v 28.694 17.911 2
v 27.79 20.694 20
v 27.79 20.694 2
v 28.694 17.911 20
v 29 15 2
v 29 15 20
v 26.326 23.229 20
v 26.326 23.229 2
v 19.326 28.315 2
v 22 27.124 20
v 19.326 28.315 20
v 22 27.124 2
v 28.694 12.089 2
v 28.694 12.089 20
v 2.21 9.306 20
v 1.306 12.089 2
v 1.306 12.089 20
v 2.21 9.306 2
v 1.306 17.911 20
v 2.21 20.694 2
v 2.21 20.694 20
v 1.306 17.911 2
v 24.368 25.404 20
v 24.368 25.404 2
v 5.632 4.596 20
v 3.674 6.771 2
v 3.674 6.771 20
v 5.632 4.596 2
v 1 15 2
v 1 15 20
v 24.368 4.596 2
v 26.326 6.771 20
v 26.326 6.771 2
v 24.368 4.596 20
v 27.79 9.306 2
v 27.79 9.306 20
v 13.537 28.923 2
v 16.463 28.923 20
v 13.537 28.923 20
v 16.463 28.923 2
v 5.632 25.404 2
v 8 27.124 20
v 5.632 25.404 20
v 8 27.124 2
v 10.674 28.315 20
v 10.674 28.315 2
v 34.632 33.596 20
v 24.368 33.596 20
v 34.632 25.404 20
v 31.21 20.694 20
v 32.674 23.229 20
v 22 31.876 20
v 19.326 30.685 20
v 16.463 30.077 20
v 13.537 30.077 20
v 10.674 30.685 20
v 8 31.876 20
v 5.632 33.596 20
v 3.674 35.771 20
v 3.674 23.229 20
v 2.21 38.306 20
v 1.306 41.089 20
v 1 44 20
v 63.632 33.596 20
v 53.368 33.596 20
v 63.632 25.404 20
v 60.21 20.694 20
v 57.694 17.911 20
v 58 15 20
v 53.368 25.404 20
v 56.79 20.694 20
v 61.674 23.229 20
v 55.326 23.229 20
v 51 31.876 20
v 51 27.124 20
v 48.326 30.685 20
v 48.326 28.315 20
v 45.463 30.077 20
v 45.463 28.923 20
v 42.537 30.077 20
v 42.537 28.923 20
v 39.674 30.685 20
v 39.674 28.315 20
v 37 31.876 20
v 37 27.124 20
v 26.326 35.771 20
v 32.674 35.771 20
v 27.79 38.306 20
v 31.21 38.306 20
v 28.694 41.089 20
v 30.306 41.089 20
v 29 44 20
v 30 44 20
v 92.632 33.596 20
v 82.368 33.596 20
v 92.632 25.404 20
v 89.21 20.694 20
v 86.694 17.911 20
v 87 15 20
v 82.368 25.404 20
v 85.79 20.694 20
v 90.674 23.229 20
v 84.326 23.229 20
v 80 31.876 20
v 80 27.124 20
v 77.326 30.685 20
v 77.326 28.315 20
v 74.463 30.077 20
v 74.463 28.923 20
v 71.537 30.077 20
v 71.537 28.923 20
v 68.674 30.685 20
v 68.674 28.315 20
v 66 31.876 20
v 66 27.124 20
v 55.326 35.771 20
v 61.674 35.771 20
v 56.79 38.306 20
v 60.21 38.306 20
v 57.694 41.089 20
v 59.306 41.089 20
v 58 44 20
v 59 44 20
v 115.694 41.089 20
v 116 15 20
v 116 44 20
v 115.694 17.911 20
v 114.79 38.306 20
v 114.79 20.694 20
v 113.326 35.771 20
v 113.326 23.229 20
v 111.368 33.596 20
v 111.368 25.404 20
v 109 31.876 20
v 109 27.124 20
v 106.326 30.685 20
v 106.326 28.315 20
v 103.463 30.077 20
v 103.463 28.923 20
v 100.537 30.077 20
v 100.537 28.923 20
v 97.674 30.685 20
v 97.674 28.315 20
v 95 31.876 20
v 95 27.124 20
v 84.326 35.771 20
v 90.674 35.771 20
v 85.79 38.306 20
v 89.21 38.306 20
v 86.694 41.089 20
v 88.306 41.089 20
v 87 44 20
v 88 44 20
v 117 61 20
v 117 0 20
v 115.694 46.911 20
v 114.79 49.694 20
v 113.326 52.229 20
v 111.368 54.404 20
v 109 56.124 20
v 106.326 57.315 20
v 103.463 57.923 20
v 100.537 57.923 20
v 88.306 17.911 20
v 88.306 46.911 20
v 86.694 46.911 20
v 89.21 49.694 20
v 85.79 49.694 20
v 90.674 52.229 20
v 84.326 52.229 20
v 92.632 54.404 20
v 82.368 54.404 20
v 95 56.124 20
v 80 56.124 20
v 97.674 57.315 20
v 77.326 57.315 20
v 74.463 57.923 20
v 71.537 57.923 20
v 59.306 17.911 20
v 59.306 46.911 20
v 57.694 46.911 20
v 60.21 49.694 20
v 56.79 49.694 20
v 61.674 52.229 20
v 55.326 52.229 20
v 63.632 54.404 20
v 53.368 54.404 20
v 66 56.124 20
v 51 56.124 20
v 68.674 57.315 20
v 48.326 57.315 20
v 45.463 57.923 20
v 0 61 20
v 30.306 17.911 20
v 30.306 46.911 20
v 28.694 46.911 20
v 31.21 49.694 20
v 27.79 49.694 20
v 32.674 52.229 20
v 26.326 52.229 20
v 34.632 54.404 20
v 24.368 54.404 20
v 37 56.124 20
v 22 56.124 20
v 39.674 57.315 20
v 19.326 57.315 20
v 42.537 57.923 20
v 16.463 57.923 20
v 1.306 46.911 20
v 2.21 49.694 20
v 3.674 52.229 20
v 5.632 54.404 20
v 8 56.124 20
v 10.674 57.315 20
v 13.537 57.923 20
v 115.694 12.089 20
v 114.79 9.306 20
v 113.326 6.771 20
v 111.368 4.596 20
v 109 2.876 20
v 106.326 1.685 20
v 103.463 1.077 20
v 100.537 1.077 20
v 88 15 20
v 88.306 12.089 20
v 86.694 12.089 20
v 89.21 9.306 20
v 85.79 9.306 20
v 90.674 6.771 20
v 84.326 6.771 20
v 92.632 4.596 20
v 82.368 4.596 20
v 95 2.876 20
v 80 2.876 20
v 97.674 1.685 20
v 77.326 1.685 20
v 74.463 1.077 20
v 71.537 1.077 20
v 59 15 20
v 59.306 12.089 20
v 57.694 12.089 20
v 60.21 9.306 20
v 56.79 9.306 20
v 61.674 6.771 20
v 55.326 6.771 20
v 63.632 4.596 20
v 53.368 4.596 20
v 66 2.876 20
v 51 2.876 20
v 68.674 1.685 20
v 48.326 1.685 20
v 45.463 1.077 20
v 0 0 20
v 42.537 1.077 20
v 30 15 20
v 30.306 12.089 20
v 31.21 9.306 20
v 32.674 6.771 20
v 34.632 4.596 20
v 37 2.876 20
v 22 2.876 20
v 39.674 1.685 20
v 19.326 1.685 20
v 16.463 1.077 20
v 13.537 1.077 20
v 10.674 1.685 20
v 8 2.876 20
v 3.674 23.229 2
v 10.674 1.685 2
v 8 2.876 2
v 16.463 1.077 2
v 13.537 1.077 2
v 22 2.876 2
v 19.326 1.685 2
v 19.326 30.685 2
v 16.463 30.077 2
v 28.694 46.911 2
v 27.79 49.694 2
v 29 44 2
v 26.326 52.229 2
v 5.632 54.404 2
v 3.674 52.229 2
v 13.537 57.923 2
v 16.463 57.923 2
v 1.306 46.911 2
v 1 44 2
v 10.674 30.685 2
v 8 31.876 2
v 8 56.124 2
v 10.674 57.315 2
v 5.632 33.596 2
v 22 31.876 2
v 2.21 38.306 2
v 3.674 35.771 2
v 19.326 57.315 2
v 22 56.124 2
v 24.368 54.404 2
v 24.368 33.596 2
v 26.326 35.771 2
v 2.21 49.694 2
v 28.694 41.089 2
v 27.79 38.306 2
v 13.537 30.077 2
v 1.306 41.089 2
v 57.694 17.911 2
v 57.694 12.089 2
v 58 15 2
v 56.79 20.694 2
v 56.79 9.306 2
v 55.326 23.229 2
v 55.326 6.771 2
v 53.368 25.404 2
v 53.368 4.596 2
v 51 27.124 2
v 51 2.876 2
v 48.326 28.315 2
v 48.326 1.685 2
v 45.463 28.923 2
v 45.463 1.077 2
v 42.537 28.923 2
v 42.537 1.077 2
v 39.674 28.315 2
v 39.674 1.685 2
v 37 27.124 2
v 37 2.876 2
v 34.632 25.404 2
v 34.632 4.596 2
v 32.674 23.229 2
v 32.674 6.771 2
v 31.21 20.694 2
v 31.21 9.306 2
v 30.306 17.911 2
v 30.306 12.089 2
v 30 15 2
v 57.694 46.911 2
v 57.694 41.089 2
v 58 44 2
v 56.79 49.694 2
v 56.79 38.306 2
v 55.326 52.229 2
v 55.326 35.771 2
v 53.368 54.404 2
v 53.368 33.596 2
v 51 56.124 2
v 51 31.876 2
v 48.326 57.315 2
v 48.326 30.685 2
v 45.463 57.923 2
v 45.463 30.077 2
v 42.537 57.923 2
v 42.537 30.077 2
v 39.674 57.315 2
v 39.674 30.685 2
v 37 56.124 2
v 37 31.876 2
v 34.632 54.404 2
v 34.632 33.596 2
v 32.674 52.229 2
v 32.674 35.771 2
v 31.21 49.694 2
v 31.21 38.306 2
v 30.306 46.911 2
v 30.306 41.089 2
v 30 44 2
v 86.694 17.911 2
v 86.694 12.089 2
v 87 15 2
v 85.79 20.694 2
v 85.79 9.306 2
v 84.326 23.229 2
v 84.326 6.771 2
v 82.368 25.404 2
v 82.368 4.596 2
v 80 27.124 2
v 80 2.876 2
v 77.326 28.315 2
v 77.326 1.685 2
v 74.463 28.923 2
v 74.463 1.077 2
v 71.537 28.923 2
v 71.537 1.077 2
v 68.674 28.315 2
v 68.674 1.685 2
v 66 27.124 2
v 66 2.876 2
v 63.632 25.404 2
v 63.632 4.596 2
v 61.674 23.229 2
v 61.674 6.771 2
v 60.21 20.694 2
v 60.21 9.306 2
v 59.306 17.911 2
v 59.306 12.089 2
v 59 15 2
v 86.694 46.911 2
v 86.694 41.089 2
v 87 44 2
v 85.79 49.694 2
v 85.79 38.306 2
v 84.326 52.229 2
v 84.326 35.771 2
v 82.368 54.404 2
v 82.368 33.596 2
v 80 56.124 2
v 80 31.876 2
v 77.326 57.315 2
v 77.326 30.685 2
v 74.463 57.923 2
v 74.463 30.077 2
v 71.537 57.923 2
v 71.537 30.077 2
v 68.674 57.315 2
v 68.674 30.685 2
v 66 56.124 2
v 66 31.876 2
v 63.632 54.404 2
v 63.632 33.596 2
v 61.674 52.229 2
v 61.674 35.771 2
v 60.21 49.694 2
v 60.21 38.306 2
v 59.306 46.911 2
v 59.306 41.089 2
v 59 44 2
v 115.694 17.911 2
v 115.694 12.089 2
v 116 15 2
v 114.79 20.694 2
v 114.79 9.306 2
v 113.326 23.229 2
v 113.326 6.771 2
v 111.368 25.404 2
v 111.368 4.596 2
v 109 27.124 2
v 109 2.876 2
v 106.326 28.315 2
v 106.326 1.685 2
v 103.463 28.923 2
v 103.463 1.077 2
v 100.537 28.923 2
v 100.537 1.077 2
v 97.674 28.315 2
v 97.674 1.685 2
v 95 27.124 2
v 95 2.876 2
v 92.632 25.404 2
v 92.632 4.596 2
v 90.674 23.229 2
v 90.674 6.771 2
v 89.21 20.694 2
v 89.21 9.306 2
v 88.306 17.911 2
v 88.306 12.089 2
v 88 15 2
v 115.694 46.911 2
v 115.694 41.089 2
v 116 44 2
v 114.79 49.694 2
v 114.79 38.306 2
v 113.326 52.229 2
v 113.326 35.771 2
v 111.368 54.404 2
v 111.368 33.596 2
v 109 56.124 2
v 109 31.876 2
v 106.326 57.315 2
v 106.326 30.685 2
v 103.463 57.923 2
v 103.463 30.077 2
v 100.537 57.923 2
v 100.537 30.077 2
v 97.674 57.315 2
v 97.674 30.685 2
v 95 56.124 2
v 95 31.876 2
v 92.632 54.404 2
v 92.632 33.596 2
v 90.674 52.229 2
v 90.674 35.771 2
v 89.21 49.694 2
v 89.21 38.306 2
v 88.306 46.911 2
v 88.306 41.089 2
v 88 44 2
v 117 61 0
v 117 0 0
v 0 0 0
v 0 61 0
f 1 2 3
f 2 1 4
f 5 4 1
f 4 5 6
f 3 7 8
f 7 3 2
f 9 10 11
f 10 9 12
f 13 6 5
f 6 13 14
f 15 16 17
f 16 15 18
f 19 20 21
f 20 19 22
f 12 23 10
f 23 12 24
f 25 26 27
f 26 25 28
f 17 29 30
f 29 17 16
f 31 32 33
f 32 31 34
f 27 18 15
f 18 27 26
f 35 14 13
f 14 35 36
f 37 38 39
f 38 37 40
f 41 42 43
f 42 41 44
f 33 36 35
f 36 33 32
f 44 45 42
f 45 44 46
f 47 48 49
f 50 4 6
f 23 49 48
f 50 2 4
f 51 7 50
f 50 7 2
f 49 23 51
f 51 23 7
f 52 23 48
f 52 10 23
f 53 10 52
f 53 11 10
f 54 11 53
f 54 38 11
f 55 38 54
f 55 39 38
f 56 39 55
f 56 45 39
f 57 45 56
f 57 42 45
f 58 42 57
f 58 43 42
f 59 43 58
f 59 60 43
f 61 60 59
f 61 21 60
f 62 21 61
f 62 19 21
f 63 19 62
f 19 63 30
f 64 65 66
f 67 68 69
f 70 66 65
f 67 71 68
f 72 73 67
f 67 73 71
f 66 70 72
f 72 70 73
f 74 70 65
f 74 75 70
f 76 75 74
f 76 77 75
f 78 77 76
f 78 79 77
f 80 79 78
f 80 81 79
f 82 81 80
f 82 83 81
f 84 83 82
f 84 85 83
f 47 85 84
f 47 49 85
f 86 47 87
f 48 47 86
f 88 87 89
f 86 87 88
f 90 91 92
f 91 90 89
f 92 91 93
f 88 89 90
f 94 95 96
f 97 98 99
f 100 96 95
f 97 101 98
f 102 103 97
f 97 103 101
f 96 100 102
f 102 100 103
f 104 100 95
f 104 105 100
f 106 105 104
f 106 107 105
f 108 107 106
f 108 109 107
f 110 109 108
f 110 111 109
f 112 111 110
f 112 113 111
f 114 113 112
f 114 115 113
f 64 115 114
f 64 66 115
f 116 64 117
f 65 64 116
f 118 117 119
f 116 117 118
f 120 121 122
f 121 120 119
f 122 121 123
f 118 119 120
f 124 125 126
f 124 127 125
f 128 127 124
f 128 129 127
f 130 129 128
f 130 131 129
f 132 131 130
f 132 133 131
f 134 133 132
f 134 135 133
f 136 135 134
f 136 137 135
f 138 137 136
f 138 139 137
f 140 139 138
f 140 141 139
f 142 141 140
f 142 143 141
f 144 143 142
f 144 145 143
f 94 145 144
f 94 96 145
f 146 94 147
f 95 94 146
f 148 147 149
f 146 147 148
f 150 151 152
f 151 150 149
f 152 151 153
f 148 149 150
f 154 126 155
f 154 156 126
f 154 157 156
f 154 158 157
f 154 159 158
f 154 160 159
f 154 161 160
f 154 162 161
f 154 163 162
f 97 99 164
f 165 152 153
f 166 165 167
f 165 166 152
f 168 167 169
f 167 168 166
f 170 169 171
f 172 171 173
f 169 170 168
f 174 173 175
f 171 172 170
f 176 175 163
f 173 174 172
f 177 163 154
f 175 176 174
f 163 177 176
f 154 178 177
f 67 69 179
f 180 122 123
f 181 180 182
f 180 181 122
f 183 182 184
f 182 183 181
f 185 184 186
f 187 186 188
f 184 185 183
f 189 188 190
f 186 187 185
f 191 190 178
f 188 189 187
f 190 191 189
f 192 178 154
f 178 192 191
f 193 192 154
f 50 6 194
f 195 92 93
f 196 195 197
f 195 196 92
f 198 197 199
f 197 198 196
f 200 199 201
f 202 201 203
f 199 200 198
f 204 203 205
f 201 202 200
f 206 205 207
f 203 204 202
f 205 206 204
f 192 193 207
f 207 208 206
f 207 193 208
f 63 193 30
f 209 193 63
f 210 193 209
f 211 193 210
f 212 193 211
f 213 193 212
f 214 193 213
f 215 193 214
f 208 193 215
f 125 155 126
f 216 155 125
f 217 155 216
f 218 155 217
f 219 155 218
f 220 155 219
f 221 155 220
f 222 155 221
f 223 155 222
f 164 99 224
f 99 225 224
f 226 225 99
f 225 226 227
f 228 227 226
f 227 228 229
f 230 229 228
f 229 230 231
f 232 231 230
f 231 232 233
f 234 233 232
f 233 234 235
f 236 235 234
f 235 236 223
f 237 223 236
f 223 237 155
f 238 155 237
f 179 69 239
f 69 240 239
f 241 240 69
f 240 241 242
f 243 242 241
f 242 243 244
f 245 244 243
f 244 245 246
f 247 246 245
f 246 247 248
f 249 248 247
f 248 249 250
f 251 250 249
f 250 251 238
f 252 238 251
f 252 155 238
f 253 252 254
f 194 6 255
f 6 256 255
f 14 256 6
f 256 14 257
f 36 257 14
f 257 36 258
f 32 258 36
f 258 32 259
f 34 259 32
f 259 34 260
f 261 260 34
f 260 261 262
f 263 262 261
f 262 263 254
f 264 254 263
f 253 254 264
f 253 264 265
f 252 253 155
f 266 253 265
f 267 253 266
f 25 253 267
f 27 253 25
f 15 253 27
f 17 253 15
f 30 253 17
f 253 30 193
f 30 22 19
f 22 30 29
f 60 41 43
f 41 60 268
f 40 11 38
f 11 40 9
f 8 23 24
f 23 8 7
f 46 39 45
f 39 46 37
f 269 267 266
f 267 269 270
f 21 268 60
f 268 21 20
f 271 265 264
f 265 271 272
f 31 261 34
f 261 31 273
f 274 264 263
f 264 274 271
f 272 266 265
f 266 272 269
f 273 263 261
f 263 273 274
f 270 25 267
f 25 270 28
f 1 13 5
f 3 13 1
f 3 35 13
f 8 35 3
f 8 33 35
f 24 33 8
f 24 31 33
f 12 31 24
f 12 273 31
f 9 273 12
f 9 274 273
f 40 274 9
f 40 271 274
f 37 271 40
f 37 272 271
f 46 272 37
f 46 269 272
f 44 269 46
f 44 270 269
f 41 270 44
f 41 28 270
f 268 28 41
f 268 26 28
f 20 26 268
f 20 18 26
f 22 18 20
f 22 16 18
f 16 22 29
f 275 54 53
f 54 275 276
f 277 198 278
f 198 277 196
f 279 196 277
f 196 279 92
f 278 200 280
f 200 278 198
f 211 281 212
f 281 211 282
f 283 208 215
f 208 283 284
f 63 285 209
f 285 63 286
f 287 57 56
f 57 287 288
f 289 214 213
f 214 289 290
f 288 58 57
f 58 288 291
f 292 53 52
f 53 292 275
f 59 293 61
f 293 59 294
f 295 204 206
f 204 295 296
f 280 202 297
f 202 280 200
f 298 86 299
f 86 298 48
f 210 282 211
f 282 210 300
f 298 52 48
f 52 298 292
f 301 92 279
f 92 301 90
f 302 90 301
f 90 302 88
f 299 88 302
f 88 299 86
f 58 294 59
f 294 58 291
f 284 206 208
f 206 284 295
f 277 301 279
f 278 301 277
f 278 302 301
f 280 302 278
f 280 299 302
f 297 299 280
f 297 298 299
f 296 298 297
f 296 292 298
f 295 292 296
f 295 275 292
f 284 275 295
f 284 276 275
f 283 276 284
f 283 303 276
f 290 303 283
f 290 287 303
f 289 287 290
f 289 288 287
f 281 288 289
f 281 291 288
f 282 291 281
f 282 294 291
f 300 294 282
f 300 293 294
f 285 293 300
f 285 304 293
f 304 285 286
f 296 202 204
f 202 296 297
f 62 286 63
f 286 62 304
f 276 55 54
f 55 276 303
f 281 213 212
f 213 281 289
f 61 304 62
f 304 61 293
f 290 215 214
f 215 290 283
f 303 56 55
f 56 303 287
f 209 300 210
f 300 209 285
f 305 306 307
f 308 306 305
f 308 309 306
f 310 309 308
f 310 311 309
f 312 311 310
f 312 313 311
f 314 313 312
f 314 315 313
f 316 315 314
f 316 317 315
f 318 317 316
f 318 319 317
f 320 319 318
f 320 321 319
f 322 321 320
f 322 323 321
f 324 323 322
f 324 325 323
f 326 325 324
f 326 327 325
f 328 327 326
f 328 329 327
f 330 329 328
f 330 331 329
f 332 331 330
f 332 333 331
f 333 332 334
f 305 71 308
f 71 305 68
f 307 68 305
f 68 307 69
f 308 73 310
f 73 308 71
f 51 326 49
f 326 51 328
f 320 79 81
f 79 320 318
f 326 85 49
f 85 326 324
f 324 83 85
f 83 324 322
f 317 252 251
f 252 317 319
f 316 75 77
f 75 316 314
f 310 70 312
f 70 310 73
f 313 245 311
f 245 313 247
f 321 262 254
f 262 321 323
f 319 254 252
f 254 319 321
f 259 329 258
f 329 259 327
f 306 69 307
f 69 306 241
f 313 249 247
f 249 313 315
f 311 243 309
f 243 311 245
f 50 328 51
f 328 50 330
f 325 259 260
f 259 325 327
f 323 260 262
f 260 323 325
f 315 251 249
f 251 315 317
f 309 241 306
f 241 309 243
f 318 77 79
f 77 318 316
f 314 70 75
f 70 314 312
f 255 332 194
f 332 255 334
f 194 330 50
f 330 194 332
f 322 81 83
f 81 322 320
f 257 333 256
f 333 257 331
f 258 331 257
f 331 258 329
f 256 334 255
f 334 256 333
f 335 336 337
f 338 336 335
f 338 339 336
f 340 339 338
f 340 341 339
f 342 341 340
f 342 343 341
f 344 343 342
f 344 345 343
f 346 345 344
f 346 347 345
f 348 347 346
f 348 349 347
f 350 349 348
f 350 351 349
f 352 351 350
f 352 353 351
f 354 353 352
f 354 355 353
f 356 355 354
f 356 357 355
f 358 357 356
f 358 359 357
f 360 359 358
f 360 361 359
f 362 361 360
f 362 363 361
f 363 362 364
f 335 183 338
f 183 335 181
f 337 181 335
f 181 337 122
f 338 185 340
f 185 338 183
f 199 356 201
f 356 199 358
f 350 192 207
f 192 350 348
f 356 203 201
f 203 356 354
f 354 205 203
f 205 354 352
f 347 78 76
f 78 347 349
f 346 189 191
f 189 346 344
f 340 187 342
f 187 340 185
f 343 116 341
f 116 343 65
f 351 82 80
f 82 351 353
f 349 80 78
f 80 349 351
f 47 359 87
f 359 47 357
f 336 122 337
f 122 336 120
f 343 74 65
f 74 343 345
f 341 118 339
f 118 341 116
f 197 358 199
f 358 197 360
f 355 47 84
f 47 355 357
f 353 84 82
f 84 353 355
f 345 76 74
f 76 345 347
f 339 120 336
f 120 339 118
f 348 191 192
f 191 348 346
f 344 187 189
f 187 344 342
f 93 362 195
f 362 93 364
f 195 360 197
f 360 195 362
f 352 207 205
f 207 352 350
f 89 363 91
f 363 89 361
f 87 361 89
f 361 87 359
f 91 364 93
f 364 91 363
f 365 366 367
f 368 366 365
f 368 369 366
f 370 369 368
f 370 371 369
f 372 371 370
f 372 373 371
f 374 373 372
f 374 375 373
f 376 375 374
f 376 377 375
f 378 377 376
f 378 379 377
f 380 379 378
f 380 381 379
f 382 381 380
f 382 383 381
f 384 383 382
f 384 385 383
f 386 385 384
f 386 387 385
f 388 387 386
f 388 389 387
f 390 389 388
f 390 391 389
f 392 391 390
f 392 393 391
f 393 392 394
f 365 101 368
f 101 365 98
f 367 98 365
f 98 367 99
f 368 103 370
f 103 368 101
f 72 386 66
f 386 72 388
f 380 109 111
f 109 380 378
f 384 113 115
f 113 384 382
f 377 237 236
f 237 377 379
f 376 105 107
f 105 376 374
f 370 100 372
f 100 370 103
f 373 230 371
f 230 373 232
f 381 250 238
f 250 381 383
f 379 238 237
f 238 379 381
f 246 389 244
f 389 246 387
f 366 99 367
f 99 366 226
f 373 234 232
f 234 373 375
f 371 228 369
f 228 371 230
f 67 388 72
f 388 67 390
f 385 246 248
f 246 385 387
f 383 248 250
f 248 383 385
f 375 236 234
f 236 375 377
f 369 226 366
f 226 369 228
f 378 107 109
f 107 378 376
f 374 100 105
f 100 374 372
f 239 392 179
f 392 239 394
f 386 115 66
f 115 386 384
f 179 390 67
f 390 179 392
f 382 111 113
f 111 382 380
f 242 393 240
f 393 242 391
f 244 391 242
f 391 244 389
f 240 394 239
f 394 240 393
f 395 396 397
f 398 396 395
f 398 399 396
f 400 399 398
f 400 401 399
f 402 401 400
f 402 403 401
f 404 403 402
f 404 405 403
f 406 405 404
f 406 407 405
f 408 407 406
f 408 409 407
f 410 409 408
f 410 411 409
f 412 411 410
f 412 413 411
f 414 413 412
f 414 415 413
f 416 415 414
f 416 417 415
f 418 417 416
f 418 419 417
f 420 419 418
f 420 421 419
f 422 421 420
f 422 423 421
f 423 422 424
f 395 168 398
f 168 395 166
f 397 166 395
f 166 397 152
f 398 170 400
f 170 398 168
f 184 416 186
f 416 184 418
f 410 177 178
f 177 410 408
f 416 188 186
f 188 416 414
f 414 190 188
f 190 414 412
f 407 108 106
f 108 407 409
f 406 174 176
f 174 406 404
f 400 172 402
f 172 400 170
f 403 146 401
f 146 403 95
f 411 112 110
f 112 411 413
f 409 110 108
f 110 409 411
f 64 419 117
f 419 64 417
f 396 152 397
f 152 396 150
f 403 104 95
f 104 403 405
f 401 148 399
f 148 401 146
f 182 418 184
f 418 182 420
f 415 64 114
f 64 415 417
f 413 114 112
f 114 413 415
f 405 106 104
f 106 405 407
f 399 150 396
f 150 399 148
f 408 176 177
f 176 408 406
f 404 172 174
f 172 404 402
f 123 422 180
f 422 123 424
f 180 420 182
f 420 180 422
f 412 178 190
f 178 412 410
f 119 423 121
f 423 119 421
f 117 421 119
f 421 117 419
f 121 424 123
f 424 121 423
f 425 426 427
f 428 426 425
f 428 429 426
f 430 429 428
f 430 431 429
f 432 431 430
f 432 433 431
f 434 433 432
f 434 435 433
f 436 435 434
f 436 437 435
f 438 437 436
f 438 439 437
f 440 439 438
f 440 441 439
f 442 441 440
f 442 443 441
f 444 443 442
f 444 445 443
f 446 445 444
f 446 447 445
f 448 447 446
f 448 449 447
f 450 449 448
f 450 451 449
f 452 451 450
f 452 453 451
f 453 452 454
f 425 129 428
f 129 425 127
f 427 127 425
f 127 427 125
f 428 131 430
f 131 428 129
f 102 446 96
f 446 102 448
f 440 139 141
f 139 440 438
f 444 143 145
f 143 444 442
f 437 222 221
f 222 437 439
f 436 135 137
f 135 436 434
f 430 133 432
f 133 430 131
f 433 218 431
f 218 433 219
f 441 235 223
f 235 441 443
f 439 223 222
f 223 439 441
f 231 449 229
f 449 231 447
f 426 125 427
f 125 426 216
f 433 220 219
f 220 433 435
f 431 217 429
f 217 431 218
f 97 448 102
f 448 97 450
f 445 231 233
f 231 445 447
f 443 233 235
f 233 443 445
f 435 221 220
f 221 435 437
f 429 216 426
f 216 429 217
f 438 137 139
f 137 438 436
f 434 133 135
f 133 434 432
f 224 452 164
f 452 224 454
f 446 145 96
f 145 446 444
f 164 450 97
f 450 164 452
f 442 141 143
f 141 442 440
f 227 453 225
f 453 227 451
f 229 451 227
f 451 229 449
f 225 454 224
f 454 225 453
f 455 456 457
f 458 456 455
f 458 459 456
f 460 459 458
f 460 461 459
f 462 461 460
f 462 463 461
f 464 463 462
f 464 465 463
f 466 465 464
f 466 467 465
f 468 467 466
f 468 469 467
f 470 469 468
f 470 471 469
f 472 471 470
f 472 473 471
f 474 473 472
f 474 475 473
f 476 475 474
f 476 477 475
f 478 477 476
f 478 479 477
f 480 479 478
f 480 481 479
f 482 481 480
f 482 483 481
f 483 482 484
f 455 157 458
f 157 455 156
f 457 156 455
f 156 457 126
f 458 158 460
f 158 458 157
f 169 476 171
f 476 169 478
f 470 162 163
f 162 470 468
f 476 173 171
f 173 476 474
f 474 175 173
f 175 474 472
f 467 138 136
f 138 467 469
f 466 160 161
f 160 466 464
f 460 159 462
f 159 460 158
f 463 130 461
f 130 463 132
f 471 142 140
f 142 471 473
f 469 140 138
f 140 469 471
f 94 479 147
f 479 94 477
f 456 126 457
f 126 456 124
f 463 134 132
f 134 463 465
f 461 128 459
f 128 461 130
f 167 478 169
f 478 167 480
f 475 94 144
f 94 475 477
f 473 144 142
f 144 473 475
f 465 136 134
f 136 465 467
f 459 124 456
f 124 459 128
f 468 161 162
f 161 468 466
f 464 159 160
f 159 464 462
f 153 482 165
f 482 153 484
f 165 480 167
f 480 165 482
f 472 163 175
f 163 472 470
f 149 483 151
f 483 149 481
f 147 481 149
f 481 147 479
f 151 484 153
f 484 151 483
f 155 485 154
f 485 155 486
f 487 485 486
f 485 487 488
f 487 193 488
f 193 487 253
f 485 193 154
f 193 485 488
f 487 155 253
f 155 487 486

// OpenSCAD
hole_radius = 14; //12 for small bottles
hole_height = 18;
height = 20;
distance = 1;

holes_per_row = 4;
holes_per_column = 2;

size_row = holes_per_row * (2 * hole_radius) + (holes_per_row + 1) * distance;
size_column = holes_per_column * (2 * hole_radius) + (holes_per_row + 1) * distance;

//size = 85;

difference() {
	cube([size_row, size_column, height]);
	translate([hole_radius + distance, hole_radius + distance, 0]) {
		for (i = [0 : holes_per_row - 1]) {
			for (j = [0 : holes_per_column - 1]) {
				translate([i * (2 * hole_radius + distance), j * (2 * hole_radius + distance), height - hole_height]) {cylinder(hole_height, r=hole_radius);}
			}
		}
	}
}
